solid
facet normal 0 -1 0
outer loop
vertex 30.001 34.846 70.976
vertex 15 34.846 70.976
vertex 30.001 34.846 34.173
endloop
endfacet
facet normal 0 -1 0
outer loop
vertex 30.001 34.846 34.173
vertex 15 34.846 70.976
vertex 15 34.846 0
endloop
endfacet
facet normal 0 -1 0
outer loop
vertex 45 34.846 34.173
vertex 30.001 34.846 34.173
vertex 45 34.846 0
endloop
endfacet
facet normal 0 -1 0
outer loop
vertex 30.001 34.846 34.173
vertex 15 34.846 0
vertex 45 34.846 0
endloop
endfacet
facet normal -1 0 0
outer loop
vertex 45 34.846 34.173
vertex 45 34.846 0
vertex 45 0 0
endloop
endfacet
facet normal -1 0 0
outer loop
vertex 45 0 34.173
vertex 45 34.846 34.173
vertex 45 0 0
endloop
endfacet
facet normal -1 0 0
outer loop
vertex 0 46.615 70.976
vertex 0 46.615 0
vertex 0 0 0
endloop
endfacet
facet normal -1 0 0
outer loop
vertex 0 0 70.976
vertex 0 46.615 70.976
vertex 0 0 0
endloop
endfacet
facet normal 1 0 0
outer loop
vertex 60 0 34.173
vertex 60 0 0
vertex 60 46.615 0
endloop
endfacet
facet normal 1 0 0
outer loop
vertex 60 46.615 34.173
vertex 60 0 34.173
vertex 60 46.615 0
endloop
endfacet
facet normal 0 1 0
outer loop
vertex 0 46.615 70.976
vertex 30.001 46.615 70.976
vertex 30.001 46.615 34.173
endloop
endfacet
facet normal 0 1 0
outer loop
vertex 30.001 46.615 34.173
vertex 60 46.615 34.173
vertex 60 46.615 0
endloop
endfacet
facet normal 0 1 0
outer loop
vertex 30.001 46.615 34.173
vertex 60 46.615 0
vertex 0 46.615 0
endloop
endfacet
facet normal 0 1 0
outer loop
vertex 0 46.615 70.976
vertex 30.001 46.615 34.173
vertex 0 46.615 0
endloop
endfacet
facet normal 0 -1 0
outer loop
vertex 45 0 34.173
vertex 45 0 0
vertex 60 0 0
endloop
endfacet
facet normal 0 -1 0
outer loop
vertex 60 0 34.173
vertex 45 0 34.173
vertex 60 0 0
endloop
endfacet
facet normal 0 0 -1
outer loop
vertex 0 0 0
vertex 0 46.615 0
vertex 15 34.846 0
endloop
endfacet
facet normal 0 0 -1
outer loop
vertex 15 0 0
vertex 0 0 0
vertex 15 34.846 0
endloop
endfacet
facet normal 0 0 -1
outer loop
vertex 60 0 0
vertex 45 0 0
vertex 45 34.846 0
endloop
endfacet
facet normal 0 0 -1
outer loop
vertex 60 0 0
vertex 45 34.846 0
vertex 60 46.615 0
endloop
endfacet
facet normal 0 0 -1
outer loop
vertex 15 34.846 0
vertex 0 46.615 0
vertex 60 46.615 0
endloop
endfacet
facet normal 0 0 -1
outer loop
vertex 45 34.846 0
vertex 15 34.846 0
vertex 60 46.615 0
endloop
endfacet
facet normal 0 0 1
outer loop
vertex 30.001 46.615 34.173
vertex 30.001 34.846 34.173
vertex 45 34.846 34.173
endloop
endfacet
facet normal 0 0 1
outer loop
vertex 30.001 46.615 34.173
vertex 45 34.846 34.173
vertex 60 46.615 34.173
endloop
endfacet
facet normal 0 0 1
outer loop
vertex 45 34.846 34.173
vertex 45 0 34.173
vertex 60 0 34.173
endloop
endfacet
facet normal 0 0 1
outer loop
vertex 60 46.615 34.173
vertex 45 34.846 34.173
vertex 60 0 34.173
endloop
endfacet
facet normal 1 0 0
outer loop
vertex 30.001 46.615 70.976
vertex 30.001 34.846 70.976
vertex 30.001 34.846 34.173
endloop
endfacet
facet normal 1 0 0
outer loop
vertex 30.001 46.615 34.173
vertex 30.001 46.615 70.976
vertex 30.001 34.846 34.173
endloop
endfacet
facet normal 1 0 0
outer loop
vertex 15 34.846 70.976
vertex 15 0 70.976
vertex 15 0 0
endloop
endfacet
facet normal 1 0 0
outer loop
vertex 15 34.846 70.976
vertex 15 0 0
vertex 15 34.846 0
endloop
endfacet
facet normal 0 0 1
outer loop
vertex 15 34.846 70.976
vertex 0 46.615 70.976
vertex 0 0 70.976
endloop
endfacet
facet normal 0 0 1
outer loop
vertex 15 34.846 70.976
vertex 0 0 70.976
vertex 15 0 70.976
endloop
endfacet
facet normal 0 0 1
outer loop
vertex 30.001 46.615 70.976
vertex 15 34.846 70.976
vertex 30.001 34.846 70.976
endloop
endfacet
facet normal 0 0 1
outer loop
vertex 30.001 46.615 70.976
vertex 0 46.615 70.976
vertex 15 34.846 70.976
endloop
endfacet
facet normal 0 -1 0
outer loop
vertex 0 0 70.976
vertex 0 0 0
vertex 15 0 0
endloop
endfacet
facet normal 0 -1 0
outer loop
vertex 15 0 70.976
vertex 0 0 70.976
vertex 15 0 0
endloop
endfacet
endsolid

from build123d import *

# Parameters (mm, degrees)
F1_DEPTH = 70.975848
F3_DEPTH = 46.616317


with BuildPart() as f1:
    # F0 (on Top) → F1 (new body)
    with BuildSketch(Plane.XY):
        Polygon((0, 46.615317), (0, 0), (15, 0), (15, 34.846107), (45, 34.846107), (45, 0), (60, 0), (60, 46.615317), align=None)
    extrude(amount=F1_DEPTH)

    # F2 (on Front) → F3 (cut, through all)
    with BuildSketch(Plane.XZ):
        Polygon((60, 34.172569), (60, 70.975848), (30.000645, 71.172569), (30.000645, 34.172569), align=None)
    extrude(amount=-F3_DEPTH, mode=Mode.SUBTRACT)


solid = f1.part
